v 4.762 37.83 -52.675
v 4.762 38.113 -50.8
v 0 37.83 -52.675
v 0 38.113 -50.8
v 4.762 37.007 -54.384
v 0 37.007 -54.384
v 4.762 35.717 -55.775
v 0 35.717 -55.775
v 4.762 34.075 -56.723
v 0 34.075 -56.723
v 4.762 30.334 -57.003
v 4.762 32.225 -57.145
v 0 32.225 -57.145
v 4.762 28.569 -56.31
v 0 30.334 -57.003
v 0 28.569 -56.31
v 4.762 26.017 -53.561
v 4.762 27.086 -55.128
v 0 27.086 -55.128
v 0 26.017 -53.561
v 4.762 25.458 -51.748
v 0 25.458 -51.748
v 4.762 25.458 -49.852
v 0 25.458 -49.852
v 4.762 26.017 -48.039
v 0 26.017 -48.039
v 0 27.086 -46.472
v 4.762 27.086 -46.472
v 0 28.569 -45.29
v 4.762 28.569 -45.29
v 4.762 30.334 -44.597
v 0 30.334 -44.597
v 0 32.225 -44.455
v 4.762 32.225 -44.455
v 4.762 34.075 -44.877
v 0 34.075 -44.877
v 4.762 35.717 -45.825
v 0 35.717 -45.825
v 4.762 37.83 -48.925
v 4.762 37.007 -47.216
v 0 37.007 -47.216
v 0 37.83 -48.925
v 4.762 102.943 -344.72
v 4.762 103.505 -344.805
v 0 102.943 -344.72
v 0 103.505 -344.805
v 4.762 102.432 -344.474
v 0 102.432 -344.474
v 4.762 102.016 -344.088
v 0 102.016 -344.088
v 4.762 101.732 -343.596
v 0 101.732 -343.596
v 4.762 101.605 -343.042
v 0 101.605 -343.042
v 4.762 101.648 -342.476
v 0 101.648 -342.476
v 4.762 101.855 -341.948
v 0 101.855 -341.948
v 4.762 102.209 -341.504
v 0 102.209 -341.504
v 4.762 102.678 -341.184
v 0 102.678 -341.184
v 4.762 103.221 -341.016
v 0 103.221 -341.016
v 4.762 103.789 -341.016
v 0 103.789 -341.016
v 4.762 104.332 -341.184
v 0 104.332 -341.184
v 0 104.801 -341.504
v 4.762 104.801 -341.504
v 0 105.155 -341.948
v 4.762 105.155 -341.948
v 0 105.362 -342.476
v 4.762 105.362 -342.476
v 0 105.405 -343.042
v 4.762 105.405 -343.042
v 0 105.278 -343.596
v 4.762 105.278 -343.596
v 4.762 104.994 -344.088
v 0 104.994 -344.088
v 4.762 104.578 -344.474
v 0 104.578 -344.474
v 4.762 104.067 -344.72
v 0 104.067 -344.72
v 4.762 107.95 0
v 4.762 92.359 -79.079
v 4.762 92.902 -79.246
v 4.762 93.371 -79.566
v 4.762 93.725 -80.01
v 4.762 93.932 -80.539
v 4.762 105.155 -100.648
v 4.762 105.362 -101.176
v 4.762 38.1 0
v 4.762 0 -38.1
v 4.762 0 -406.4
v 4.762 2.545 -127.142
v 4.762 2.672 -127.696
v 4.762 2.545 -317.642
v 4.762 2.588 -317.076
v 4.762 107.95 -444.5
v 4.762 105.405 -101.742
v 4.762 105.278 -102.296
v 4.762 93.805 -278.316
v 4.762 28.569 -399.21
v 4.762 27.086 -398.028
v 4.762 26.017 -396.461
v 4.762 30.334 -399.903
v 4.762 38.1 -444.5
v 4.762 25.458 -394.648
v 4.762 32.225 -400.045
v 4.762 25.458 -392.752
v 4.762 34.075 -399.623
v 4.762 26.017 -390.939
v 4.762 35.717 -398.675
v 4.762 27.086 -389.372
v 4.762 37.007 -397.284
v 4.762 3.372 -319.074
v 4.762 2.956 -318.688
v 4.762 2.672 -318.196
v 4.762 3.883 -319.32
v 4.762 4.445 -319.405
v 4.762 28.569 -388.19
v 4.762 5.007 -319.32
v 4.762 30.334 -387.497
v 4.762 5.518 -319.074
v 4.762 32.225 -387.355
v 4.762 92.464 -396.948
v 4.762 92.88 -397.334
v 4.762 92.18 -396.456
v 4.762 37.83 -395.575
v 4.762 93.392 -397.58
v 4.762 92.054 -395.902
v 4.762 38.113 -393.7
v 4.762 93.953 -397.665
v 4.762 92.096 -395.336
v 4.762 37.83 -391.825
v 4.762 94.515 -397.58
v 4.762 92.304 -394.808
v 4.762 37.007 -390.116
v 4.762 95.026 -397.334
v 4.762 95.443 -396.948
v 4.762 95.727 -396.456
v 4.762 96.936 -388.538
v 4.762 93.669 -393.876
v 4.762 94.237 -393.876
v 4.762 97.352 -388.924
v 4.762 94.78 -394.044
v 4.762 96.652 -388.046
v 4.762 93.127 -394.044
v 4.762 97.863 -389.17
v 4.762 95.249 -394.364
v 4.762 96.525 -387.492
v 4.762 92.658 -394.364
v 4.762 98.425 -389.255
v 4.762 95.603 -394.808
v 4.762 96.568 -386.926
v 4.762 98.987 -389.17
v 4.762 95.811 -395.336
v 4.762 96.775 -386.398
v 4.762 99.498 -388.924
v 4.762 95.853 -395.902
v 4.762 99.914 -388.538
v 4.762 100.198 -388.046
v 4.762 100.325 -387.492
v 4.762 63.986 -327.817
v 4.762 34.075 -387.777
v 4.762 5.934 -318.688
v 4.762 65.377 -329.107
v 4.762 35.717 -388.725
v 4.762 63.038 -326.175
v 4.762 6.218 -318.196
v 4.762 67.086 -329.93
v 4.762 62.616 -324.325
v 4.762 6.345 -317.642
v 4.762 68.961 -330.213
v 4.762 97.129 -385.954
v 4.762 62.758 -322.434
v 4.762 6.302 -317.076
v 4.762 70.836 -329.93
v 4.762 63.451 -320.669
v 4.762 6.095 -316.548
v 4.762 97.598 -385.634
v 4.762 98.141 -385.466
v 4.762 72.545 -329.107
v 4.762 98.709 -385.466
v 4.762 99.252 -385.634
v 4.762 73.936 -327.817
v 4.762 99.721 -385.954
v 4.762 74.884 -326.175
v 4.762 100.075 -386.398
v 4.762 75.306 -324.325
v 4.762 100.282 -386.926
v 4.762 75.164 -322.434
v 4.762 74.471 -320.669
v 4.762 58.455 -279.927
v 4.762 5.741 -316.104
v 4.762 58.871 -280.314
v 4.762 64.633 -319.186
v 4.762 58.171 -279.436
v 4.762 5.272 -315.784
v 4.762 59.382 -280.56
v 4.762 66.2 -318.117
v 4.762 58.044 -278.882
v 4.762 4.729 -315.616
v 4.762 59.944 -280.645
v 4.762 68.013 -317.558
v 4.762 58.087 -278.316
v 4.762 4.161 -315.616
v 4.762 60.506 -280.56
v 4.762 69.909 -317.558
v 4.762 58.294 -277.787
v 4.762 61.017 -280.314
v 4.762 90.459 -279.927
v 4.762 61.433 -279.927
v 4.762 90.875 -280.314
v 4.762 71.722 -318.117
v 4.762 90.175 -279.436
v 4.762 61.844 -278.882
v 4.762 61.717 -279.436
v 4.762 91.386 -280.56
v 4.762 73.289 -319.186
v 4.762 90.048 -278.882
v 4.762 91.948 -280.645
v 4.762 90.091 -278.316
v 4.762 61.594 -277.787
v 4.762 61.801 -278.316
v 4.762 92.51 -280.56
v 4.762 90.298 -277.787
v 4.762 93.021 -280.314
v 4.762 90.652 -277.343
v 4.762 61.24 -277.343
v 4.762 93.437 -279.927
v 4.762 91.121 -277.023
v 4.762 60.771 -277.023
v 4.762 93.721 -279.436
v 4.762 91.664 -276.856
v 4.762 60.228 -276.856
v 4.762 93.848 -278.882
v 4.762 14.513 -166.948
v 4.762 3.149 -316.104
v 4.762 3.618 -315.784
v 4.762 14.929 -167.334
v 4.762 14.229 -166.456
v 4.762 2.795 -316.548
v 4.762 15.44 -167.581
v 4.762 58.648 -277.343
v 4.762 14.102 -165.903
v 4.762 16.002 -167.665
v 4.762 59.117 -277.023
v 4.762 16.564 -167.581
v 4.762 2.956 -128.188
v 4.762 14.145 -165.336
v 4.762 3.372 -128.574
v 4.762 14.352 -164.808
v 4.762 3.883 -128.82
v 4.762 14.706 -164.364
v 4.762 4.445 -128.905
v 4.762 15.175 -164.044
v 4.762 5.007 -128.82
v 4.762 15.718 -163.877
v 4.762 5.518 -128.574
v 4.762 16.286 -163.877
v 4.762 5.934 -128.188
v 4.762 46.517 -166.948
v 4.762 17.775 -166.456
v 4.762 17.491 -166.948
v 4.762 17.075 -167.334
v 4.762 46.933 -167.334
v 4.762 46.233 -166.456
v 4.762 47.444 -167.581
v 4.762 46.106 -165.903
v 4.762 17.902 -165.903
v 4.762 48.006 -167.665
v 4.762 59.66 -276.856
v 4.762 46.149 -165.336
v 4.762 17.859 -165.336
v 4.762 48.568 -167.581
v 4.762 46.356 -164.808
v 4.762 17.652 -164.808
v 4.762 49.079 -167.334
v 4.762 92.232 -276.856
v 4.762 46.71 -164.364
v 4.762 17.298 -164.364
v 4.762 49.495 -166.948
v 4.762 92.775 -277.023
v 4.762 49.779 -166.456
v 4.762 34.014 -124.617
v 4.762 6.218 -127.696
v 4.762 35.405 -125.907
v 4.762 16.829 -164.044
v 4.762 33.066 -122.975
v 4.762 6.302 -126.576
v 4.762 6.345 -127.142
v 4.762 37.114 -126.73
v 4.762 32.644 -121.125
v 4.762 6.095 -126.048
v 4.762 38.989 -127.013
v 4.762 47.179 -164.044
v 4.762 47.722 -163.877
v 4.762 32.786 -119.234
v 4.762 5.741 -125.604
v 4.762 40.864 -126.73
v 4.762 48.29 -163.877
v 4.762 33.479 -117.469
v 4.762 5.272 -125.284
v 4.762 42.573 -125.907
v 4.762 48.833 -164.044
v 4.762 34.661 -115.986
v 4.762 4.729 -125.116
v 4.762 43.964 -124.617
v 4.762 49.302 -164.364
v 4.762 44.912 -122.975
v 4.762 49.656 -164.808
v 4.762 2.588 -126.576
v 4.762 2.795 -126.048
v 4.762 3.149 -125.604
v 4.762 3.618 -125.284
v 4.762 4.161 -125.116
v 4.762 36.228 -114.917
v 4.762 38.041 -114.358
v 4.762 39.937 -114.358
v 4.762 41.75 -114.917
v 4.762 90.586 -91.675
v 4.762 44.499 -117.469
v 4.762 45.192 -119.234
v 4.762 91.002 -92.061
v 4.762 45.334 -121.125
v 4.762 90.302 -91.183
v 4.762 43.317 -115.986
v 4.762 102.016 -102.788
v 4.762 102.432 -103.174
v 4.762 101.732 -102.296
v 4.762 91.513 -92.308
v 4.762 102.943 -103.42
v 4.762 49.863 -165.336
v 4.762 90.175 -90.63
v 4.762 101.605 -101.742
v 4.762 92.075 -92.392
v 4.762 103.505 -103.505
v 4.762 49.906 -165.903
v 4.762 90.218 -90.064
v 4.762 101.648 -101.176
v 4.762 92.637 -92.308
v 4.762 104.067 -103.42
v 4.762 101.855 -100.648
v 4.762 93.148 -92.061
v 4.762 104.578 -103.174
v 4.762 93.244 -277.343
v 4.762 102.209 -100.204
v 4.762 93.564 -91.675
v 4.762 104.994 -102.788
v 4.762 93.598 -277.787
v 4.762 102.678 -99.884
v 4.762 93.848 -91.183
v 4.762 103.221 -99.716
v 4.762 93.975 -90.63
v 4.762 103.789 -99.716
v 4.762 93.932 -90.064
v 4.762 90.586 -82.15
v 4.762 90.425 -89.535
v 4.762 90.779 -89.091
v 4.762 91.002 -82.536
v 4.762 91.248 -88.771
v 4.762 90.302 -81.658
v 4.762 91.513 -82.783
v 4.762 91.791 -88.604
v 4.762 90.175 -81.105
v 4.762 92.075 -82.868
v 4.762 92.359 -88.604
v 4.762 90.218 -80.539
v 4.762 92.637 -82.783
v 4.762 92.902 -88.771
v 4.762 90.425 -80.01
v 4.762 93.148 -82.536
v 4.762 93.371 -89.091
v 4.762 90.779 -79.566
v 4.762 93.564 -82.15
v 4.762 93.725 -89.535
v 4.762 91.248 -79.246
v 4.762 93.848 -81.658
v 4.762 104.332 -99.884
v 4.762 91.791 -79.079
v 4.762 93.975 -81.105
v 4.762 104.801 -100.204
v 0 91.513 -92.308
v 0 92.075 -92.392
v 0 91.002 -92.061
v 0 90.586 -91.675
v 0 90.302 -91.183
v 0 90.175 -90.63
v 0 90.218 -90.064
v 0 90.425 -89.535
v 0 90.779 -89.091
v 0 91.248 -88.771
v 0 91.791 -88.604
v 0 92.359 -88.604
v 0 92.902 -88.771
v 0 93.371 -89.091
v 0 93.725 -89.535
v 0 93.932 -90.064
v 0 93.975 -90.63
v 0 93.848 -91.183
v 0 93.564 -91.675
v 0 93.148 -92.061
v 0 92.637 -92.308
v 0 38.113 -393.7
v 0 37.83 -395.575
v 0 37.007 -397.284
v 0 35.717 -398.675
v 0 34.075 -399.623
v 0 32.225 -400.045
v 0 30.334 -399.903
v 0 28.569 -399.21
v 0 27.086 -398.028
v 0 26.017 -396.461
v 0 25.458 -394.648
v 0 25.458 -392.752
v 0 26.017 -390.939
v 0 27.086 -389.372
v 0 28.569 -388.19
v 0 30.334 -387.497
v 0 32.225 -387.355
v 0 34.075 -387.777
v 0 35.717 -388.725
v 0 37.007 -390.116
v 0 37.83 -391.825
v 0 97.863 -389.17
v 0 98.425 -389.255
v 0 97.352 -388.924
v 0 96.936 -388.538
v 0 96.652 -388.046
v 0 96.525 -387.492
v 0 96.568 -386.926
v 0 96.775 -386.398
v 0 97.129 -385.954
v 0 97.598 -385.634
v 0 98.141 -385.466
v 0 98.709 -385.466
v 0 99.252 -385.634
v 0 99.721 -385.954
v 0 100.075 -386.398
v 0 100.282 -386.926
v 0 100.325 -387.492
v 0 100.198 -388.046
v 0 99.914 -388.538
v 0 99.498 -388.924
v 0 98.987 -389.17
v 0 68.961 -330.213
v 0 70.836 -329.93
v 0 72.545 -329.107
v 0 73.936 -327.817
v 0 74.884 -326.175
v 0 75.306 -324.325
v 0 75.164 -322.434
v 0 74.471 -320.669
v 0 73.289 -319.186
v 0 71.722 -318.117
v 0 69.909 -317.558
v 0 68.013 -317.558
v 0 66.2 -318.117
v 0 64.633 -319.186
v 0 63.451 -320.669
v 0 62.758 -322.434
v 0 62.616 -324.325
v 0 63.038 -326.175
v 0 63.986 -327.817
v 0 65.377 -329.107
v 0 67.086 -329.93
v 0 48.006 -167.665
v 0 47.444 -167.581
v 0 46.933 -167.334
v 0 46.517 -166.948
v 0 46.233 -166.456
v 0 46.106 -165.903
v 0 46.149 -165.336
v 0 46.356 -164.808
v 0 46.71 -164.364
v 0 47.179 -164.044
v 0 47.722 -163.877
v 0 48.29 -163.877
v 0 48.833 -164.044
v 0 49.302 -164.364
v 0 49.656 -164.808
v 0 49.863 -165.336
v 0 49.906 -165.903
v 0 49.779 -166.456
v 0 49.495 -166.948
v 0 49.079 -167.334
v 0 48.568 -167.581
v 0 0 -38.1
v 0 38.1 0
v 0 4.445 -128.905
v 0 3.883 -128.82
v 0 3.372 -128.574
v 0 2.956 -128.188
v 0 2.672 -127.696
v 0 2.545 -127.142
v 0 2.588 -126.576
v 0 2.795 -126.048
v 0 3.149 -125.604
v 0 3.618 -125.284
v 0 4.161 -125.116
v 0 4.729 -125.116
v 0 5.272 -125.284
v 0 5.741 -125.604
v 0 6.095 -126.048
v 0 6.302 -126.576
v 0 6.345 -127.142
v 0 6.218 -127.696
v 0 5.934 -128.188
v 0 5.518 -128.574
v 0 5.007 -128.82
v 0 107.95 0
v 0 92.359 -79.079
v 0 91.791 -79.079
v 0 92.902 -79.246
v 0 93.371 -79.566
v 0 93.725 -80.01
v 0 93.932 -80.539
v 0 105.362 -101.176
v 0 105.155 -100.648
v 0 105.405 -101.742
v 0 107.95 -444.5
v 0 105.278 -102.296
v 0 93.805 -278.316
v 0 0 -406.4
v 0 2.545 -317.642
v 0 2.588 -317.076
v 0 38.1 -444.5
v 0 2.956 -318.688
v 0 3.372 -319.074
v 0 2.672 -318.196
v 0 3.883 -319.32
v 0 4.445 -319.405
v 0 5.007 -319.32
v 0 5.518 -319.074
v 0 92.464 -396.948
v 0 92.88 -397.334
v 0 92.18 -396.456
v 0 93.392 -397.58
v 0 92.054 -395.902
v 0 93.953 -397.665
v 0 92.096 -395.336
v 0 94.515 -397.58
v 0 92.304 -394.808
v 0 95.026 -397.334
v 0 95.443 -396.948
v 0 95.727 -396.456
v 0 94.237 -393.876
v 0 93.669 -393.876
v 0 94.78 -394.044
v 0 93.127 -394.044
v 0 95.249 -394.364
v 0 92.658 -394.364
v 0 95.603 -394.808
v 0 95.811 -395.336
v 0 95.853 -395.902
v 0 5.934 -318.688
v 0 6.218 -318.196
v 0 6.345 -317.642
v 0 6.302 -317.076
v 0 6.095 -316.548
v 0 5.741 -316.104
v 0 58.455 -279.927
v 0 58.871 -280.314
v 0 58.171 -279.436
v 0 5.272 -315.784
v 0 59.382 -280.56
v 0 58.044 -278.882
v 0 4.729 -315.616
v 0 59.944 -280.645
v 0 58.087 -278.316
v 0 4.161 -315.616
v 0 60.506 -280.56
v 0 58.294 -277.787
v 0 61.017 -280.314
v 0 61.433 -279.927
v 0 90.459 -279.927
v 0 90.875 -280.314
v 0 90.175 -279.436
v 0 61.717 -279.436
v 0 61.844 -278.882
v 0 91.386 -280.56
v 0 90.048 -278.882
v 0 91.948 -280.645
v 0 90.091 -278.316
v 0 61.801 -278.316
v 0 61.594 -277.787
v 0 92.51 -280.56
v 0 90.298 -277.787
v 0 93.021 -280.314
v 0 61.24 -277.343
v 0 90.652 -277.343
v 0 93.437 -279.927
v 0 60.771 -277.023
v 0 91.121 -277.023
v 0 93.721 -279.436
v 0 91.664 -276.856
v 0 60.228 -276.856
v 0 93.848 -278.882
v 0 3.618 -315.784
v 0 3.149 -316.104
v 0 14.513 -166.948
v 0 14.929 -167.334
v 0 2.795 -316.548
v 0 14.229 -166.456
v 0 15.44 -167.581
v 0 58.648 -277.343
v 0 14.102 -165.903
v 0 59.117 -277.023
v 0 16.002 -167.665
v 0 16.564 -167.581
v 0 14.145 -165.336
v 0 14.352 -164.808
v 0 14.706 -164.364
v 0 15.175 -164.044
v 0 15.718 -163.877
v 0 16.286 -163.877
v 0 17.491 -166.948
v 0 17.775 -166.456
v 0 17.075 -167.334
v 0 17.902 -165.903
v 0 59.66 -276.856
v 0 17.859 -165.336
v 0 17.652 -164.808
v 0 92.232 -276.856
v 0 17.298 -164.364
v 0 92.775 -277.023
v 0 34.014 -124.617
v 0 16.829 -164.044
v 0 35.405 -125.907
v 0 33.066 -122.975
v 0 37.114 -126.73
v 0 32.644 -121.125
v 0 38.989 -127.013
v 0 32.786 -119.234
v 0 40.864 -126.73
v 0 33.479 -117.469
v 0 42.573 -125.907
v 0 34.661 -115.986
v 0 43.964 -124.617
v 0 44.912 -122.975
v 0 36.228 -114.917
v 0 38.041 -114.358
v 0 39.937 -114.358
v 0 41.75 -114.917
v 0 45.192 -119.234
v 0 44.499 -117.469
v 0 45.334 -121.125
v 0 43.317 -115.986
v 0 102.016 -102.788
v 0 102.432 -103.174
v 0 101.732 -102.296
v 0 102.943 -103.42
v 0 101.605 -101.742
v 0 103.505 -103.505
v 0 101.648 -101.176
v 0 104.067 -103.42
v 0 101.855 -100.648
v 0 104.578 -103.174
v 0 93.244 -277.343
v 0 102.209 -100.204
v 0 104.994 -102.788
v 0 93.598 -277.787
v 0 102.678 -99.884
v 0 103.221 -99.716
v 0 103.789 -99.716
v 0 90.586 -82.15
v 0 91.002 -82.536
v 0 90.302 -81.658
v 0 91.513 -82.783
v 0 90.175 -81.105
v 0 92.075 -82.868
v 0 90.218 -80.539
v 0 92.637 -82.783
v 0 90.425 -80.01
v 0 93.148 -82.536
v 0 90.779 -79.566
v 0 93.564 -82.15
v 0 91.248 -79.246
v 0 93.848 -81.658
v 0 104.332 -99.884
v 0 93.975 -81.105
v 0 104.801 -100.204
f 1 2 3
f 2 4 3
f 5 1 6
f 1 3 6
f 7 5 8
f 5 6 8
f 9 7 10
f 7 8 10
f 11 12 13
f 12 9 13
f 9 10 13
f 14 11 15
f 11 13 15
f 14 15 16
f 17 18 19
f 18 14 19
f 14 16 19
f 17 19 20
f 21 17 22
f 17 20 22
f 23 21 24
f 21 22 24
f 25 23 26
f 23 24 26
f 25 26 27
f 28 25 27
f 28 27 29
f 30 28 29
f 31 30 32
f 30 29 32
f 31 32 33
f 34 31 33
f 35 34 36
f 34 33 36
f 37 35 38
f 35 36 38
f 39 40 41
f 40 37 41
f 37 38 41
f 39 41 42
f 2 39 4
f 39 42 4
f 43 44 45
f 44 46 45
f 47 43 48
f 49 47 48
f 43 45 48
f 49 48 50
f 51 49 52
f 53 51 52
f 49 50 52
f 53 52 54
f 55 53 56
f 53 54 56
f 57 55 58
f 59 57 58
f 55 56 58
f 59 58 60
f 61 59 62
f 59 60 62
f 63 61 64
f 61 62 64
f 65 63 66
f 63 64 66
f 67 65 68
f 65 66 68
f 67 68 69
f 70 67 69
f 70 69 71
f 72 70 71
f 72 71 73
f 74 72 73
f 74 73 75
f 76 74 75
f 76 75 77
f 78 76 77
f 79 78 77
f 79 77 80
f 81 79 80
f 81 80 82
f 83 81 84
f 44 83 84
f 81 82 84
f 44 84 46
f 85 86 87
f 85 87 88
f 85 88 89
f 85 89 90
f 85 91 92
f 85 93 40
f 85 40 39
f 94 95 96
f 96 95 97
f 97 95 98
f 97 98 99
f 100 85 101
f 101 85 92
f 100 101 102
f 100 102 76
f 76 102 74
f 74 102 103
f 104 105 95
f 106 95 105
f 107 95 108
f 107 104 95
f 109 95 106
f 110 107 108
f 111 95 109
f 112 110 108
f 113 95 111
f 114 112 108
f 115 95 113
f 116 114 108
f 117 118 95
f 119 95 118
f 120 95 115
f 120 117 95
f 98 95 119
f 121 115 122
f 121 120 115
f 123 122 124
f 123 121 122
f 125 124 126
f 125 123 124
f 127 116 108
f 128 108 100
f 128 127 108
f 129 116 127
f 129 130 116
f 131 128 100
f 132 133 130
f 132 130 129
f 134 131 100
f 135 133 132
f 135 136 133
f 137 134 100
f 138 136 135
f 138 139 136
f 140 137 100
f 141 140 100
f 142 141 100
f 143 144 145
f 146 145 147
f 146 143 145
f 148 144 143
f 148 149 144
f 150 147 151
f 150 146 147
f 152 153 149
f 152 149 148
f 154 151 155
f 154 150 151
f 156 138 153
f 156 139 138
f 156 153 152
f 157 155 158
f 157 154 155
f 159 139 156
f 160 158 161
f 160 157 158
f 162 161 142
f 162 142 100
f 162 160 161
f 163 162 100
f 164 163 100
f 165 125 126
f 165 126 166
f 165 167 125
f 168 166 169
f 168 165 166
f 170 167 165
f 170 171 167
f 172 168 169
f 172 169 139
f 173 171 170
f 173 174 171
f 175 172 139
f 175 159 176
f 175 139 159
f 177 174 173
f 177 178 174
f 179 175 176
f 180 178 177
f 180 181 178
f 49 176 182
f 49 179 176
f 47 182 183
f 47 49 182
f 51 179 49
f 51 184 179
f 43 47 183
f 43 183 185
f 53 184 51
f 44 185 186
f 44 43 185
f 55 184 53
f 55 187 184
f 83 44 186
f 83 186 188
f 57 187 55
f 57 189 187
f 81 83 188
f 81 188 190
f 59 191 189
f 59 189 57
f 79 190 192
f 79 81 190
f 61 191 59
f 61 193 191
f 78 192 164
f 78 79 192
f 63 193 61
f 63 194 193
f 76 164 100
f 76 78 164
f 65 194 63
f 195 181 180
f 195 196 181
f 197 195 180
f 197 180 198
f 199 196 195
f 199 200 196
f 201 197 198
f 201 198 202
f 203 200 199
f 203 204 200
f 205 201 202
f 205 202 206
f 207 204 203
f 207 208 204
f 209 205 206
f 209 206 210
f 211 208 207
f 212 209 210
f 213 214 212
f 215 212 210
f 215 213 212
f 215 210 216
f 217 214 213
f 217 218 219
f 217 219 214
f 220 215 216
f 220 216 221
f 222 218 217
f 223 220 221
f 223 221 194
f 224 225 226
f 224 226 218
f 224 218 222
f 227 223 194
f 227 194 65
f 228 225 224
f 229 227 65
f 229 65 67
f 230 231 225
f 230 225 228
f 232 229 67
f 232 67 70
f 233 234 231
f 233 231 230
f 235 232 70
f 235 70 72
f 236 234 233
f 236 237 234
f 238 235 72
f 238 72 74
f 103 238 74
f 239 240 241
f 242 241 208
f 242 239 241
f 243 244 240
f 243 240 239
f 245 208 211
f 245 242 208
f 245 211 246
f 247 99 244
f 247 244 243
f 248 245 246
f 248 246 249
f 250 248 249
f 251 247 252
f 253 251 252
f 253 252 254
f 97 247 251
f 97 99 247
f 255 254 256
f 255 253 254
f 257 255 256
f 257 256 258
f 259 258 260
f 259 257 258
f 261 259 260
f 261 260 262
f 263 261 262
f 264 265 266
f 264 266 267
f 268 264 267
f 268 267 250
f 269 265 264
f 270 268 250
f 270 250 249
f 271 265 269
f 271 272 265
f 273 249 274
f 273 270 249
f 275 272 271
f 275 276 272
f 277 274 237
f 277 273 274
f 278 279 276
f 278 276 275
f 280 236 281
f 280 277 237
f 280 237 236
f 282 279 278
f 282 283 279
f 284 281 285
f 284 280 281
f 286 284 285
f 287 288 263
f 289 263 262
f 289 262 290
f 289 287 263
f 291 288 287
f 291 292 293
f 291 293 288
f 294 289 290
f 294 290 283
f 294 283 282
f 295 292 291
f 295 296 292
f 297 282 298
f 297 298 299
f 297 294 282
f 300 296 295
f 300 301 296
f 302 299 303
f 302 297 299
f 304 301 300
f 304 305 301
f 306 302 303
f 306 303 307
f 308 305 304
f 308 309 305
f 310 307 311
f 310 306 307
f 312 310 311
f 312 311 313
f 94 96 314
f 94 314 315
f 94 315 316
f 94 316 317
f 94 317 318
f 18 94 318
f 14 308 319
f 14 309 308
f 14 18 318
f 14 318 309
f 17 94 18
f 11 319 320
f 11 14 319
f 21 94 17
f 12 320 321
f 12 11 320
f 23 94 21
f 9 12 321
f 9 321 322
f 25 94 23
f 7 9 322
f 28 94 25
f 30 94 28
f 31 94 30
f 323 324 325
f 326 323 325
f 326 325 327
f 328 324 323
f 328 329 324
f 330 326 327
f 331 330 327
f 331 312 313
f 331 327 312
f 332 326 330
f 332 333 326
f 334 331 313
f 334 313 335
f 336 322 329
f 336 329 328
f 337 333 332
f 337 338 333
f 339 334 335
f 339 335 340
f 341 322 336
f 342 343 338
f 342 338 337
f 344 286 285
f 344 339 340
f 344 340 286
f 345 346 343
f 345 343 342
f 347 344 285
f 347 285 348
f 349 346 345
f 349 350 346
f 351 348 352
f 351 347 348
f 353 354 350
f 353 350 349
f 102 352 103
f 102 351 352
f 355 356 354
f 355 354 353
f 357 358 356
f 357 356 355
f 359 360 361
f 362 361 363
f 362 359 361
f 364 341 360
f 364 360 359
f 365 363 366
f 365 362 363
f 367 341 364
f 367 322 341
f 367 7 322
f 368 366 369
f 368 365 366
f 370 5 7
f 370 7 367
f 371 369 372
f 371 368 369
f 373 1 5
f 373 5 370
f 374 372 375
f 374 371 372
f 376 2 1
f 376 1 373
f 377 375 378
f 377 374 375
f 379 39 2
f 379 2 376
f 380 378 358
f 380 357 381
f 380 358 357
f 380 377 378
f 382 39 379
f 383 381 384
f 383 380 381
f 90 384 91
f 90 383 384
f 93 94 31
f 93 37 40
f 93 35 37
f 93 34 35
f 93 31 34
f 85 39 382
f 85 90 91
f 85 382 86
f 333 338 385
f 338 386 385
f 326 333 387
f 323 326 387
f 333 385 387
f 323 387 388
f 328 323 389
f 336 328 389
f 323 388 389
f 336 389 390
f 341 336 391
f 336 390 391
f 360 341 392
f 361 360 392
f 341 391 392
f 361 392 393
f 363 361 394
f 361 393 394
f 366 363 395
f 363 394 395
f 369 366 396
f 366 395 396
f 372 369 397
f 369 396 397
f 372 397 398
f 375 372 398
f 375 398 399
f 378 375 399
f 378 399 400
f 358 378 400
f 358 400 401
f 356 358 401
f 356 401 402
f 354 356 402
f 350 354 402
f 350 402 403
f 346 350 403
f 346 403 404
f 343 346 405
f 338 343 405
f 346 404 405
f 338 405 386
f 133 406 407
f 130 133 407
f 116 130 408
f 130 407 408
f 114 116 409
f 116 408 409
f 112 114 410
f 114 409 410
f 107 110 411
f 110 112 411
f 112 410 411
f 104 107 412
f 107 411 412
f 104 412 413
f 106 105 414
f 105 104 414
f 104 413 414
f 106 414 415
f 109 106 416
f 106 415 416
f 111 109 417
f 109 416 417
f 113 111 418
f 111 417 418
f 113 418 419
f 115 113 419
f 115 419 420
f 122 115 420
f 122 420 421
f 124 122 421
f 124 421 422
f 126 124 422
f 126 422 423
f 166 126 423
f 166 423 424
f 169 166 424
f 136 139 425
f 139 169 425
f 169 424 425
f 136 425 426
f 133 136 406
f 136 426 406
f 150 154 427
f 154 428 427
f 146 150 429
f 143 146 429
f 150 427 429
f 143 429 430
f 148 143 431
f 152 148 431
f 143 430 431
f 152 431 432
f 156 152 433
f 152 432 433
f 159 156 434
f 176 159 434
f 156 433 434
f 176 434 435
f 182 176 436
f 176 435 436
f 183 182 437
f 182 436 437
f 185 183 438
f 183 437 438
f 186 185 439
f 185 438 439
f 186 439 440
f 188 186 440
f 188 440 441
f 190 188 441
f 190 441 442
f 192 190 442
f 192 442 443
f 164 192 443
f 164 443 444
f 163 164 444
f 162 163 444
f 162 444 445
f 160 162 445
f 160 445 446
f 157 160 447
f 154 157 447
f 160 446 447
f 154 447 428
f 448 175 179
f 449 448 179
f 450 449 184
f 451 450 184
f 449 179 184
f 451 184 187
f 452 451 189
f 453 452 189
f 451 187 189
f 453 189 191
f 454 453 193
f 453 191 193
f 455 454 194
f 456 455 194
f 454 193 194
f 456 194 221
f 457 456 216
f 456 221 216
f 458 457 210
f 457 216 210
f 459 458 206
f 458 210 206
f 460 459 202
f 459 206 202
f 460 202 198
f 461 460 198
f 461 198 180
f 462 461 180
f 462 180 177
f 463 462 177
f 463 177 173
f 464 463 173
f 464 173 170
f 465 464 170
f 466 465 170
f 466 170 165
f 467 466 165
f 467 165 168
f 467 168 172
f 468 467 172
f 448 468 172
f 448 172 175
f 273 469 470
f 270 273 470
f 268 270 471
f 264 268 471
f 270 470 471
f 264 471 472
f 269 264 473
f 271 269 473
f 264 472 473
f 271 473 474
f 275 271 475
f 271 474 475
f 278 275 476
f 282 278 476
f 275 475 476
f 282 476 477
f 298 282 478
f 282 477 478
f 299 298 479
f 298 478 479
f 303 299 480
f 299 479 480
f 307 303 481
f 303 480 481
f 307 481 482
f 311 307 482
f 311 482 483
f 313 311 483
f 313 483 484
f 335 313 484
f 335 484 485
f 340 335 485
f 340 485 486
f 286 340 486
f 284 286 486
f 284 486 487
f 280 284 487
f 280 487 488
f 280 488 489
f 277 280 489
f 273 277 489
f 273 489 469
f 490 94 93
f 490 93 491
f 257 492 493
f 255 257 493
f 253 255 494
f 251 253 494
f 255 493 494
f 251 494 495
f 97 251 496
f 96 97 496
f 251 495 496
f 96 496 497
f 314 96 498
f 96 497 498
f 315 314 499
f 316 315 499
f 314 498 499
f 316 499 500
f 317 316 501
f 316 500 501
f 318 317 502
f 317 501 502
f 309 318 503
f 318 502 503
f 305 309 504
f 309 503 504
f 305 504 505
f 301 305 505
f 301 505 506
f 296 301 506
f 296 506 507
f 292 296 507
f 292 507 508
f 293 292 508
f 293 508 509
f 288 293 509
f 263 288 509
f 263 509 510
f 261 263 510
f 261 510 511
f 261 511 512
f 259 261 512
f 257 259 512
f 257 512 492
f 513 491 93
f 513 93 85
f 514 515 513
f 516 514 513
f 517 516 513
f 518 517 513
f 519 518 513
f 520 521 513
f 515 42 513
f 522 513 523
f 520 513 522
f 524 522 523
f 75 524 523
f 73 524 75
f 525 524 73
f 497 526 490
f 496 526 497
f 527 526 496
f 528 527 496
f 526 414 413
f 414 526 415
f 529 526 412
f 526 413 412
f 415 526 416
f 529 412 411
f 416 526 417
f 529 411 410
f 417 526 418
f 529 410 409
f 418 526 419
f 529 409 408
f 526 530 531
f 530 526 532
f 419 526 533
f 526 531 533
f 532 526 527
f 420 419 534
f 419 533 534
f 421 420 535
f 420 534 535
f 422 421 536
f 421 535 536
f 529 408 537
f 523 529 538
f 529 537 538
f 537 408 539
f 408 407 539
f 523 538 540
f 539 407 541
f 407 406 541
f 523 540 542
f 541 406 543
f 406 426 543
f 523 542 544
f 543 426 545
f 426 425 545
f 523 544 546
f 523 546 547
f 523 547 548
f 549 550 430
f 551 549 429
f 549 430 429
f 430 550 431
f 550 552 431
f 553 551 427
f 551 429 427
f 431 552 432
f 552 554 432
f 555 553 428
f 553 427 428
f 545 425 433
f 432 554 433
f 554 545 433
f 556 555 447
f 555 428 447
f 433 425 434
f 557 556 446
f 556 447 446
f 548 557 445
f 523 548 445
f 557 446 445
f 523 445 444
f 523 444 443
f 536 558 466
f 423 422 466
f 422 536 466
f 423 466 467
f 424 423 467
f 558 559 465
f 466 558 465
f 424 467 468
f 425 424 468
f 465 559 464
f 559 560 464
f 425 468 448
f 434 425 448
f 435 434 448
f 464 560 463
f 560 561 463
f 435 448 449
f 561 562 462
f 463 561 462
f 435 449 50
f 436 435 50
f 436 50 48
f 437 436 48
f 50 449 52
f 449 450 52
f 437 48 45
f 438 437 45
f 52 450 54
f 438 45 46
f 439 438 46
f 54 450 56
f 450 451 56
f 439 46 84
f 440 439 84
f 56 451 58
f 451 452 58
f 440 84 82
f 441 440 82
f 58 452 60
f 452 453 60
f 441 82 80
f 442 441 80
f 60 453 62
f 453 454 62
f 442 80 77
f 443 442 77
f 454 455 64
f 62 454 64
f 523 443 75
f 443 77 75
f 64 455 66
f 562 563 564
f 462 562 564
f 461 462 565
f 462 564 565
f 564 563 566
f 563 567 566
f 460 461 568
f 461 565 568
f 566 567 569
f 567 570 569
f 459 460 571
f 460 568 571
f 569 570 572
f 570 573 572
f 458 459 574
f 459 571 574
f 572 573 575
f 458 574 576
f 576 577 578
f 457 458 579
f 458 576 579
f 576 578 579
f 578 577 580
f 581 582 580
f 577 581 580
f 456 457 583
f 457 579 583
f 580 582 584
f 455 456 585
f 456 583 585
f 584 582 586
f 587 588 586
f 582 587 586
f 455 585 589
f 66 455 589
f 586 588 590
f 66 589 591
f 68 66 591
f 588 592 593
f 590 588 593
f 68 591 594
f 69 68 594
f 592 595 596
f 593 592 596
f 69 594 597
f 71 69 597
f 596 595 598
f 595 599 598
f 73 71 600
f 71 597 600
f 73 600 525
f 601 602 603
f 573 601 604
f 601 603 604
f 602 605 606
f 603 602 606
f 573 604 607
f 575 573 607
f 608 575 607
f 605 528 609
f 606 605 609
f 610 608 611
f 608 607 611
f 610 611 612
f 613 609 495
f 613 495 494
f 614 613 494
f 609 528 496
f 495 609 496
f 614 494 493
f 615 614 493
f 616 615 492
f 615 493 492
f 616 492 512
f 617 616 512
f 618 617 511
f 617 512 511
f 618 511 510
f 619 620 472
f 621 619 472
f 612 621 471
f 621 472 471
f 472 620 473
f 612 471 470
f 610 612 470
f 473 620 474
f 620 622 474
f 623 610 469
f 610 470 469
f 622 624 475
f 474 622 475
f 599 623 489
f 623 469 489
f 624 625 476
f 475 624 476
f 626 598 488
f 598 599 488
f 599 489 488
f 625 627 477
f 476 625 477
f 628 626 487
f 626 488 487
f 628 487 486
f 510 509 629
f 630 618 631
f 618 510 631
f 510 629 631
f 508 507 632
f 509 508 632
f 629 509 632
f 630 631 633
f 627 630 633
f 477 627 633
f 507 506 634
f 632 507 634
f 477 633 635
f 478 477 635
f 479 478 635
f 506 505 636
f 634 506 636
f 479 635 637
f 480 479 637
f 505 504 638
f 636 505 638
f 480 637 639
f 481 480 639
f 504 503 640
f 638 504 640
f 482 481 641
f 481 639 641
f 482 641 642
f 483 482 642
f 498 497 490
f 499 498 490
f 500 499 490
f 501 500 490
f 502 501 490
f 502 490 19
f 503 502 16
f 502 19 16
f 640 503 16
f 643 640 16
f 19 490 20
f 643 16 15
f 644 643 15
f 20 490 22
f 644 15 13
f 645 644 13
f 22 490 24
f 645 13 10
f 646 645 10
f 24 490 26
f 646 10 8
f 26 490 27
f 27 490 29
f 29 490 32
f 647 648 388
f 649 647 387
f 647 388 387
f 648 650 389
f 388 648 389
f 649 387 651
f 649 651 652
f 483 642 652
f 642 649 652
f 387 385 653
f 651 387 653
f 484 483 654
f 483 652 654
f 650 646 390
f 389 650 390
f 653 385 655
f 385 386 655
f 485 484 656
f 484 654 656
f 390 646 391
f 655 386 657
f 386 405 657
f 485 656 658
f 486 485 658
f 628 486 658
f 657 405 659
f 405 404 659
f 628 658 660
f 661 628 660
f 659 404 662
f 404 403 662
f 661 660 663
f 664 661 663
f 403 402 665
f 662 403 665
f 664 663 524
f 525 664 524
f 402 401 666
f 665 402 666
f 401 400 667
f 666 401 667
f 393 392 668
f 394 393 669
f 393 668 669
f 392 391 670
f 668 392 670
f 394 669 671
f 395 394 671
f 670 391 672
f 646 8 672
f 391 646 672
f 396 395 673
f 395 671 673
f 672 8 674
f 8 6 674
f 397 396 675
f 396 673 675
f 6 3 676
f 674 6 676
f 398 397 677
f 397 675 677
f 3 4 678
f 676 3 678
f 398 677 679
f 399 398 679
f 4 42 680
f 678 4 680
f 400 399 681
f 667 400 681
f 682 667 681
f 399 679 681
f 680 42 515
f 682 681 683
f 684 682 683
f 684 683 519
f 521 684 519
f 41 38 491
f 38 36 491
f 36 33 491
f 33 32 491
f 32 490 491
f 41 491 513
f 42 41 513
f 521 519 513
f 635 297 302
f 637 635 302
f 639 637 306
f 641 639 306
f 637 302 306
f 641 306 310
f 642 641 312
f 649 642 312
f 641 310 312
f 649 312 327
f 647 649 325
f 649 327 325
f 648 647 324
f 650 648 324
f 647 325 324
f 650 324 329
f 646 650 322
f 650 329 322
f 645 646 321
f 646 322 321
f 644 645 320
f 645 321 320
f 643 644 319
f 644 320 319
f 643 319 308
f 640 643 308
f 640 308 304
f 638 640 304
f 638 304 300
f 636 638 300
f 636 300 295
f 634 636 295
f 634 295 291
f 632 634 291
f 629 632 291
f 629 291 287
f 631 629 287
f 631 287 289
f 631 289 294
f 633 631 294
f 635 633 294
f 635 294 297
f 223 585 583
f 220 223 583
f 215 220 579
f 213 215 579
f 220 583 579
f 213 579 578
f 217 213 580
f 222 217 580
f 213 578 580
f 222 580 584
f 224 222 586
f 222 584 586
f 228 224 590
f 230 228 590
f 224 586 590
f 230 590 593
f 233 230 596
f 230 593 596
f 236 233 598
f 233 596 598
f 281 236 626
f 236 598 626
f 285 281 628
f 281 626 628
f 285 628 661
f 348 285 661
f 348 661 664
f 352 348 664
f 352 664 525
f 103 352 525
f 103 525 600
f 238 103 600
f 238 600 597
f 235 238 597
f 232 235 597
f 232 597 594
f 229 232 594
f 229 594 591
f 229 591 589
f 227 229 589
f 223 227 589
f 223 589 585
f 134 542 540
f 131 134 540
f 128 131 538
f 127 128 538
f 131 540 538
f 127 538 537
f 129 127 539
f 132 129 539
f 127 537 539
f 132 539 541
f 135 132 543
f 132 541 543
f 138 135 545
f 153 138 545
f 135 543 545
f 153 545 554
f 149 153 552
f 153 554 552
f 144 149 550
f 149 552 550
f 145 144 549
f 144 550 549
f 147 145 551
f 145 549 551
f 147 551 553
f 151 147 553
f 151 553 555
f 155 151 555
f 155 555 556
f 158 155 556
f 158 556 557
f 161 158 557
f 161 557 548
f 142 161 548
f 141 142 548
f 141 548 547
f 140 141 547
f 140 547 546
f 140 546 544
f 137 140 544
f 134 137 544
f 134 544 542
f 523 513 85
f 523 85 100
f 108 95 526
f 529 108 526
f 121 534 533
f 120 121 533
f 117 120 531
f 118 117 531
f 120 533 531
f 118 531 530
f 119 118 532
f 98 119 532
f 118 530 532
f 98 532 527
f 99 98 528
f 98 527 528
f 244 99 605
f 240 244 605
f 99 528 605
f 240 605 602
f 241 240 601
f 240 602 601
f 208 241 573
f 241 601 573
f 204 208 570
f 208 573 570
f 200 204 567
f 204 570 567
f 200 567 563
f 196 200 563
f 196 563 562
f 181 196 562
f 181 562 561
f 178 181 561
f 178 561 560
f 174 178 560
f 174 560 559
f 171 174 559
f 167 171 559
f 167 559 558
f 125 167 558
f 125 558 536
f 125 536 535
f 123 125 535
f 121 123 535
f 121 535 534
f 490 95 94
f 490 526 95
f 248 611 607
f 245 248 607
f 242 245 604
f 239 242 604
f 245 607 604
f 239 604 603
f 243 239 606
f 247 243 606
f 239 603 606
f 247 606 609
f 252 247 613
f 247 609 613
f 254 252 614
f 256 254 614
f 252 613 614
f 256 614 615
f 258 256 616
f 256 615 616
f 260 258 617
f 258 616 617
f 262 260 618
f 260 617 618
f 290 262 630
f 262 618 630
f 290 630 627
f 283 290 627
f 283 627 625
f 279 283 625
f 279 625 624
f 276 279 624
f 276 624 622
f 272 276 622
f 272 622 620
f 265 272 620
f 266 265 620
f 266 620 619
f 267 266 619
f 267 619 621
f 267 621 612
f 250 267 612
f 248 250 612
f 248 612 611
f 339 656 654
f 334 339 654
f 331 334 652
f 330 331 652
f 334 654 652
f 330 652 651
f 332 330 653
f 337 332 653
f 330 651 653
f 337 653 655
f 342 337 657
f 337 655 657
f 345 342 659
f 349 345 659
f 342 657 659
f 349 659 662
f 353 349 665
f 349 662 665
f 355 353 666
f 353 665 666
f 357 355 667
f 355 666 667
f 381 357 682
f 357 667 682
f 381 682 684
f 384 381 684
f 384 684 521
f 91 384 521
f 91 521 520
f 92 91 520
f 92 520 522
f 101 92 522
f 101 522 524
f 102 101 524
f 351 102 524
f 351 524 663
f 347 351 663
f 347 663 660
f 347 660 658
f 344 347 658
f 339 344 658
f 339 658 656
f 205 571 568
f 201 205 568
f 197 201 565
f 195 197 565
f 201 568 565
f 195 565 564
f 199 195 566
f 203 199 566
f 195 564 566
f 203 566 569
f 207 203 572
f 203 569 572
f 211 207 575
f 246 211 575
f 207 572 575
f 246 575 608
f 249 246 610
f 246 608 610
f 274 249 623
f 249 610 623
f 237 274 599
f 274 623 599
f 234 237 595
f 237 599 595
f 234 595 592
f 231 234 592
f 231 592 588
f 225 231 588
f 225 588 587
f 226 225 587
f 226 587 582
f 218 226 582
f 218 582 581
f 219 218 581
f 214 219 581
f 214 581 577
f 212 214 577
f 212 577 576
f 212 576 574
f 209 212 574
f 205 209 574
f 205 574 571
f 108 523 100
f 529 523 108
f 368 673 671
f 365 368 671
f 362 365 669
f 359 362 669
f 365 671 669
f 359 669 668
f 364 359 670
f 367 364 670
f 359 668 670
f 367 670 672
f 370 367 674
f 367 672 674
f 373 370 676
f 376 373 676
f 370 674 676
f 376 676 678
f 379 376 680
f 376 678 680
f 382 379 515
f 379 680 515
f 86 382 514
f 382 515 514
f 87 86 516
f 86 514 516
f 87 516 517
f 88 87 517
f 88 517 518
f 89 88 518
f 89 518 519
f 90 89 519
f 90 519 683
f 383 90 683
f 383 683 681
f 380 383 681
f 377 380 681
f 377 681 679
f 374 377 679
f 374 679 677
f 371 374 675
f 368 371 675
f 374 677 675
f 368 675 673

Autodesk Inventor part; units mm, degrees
ref_plane "YZ Plane" through (0, 0, 0) normal (1, 0, 0) x (0, 1, 0)
ref_plane "XZ Plane" through (0, 0, 0) normal (0, 1, 0) x (-1, 0, 0)
ref_plane "XY Plane" through (0, 0, 0) normal (0, 0, 1) x (1, 0, 0)
sketch "Sketch1" plane through (0, 0, 0) normal (1, 0, 0) x (0, 1, 0)
  line L0 (0, 0) -> (107.95, 0)
  line L1 (107.95, 0) -> (107.95, -444.5)
  line L2 (107.95, -444.5) -> (0, -444.5)
  line L3 (0, -444.5) -> (0, 0)
  circle A0 centre (31.75, -50.8) radius 6.3627
  circle A1 centre (31.75, -393.7) radius 6.3627
  circle A2 centre (92.6338, -165.5318) radius 1.5875
  circle A3 centre (76.6318, -165.5318) radius 1.5875
  circle A4 centre (15.3162, -278.9682) radius 1.5875
  circle A5 centre (31.3182, -278.9682) radius 1.5875
  dimension "d0" = 107.95
  dimension "d1" = 444.5
  dimension "d2" = 12.7254
  dimension "d3" = 31.75
  dimension "d4" = 50.8
  dimension "d5" = 50.8
  dimension "d22" = 165.5318
  dimension "d23" = 3.175
  dimension "d24" = 15.3162
  dimension "d25" = 3.175
  dimension "d26" = 16.002
  dimension "d27" = 165.5318
  dimension "d28" = 3.175
  dimension "d29" = 15.3162
  dimension "d30" = 165.5318
  dimension "d31" = 3.175
  dimension "d32" = 16.002
  dimension "d33" = 165.5318
extrude "Extrusion1" add sketch "Sketch1" along normal blind 4.7625 contours L0 L1 L2 L3 | A2 | A3 | A4 | A5
chamfer "Chamfer1" distance 38.1 angle 45 1 edges at (2.3813, 0, 0)
chamfer "Chamfer2" distance 38.1 angle 45 1 edges at (2.3813, 0, -444.5)
sketch "Sketch2" plane through (4.7625, 0, 0) normal (1, 0, 0) x (0, 0, -1)
  line L0 (444.5, 38.1) -> (406.4, 0) projected
  line L1 (444.5, 38.1) -> (444.5, 107.95) projected
  line L2 (444.5, 107.95) -> (0, 107.95) projected
  line L3 (0, 107.95) -> (0, 38.1) projected
  line L4 (38.1, 0) -> (0, 38.1) projected
  line L5 (38.1, 0) -> (406.4, 0) projected
  circle A0 centre (393.7, 31.75) radius 6.3627 projected
  circle A1 centre (50.8, 31.75) radius 6.3627 projected
  circle A2 centre (120.65, 38.989) radius 6.3627
  circle A3 centre (323.85, 68.961) radius 6.3627
  point P0 (0, 0)
  dimension "d14" = 12.7254
  dimension "d15" = 120.65
  dimension "d17" = 12.7254
  dimension "d19" = 120.65
  dimension "d78" = 38.989
  dimension "d79" = 38.989
extrude "Extrusion2" cut sketch "Sketch2" against normal blind 25.4 contours A2 | A3
sketch "Sketch6" plane through (4.7625, 0, 0) normal (1, 0, 0) x (0, 0, -1)
  circle A0 centre (120.65, 38.989) radius 6.3627 projected
  circle A1 centre (323.85, 68.961) radius 6.3627 projected
  line L0 (444.5, 38.1) -> (406.4, 0) projected
  line L1 (444.5, 38.1) -> (444.5, 107.95) projected
  line L2 (444.5, 107.95) -> (0, 107.95) projected
  line L3 (0, 107.95) -> (0, 38.1) projected
  line L4 (38.1, 0) -> (0, 38.1) projected
  line L5 (38.1, 0) -> (406.4, 0) projected
  circle A2 centre (393.7, 31.75) radius 6.3627 projected
  circle A3 centre (50.8, 31.75) radius 6.3627 projected
  point P0 (0, 0)
  point P1 (165.7604, 16.002)
  point P2 (165.7604, 48.006)
  point P3 (278.7396, 91.948)
  point P4 (278.7396, 59.944)
  dimension "d80" = 45.1104
  dimension "d81" = 45.1104
  dimension "d82" = 32.004
  dimension "d83" = 16.002
  dimension "d84" = 32.004
  dimension "d85" = 16.002
  dimension "d86" = 45.1104
  dimension "d87" = 45.1104
hole "Hole1" at (4.7625, 16.002, -165.7604) at (4.7625, 48.006, -165.7604) at (4.7625, 91.948, -278.7396) at (4.7625, 59.944, -278.7396) direction (-1, 0, 0) diameter 3.81 end through all
sketch "Sketch7" plane through (4.7625, 0, 0) normal (1, 0, 0) x (0, 0, -1)
  circle A0 centre (278.7396, 91.948) radius 1.905 projected
  circle A1 centre (165.7604, 16.002) radius 1.905 projected
  circle A2 centre (165.7604, 48.006) radius 1.905 projected
  circle A3 centre (278.7396, 59.944) radius 1.905 projected
  circle A4 centre (120.65, 38.989) radius 6.3627 projected
  circle A5 centre (323.85, 68.961) radius 6.3627 projected
  line L0 (444.5, 38.1) -> (406.4, 0) projected
  line L1 (444.5, 38.1) -> (444.5, 107.95) projected
  line L2 (444.5, 107.95) -> (0, 107.95) projected
  line L3 (0, 107.95) -> (0, 38.1) projected
  line L4 (38.1, 0) -> (0, 38.1) projected
  line L5 (38.1, 0) -> (406.4, 0) projected
  circle A6 centre (393.7, 31.75) radius 6.3627 projected
  circle A7 centre (50.8, 31.75) radius 6.3627 projected
  line L6 (395.7601, 93.9533) -> (387.35, 98.425)
  circle A8 centre (387.35, 98.425) radius 9.525
  point P0 (0, 0)
  point P1 (80.9625, 92.075)
  point P2 (90.4875, 92.075)
  dimension "d102" = 19.05
  dimension "d95" = 15.875
  dimension "d96" = 15.875
  dimension "d97" = 9.525
  dimension "d98" = 80.9625
  dimension "d99" = 9.525
  dimension "d100" = 57.15
  dimension "d101" = 28
hole "Hole2" at (4.7625, 92.075, -80.9625) at (4.7625, 92.075, -90.4875) at (4.7625, 98.425, -387.35) at (4.7625, 93.9533, -395.7601) direction (-1, 0, 0) diameter 3.81 depth 25.4 tip angle 118
sketch "Sketch8" plane through (4.7625, 0, 0) normal (1, 0, 0) x (0, 0, -1)
  circle A0 centre (387.35, 98.425) radius 1.905 projected
  circle A1 centre (80.9625, 92.075) radius 1.905 projected
  circle A2 centre (90.4875, 92.075) radius 1.905 projected
  circle A3 centre (395.7601, 93.9533) radius 1.905 projected
  circle A4 centre (278.7396, 91.948) radius 1.905 projected
  circle A5 centre (165.7604, 16.002) radius 1.905 projected
  circle A6 centre (165.7604, 48.006) radius 1.905 projected
  circle A7 centre (278.7396, 59.944) radius 1.905 projected
  circle A8 centre (120.65, 38.989) radius 6.3627 projected
  circle A9 centre (323.85, 68.961) radius 6.3627 projected
  line L0 (444.5, 38.1) -> (406.4, 0) projected
  line L1 (444.5, 38.1) -> (444.5, 107.95) projected
  line L2 (444.5, 107.95) -> (0, 107.95) projected
  line L3 (0, 107.95) -> (0, 38.1) projected
  line L4 (38.1, 0) -> (0, 38.1) projected
  line L5 (38.1, 0) -> (406.4, 0) projected
  circle A10 centre (393.7, 31.75) radius 6.3627 projected
  circle A11 centre (50.8, 31.75) radius 6.3627 projected
  point P0 (0, 0)
  point P1 (101.6, 103.505)
  point P2 (342.9, 103.505)
  point P3 (127, 4.445)
  point P4 (317.5, 4.445)
  dimension "d110" = 4.445
  dimension "d111" = 4.445
  dimension "d112" = 101.6
  dimension "d113" = 101.6
  dimension "d114" = 4.445
  dimension "d115" = 4.445
  dimension "d123" = 127
  dimension "d124" = 127
hole "Hole3" at (4.7625, 103.505, -101.6) at (4.7625, 103.505, -342.9) at (4.7625, 4.445, -127) at (4.7625, 4.445, -317.5) direction (-1, 0, 0) diameter 3.81 depth 25.4 tip angle 118
equation "\"d19\" = d15"
equation "\"d81\" = d80"
equation "\"d87\" = d86"
equation "\"d96\" = d95"
equation "\"d110\" = d111"
equation "\"d112\" = d113"
equation "\"d114\" = d111"
equation "\"d115\" = d111"
equation "\"d124\" = d123"
properties part number "DriveTrain3.0"
